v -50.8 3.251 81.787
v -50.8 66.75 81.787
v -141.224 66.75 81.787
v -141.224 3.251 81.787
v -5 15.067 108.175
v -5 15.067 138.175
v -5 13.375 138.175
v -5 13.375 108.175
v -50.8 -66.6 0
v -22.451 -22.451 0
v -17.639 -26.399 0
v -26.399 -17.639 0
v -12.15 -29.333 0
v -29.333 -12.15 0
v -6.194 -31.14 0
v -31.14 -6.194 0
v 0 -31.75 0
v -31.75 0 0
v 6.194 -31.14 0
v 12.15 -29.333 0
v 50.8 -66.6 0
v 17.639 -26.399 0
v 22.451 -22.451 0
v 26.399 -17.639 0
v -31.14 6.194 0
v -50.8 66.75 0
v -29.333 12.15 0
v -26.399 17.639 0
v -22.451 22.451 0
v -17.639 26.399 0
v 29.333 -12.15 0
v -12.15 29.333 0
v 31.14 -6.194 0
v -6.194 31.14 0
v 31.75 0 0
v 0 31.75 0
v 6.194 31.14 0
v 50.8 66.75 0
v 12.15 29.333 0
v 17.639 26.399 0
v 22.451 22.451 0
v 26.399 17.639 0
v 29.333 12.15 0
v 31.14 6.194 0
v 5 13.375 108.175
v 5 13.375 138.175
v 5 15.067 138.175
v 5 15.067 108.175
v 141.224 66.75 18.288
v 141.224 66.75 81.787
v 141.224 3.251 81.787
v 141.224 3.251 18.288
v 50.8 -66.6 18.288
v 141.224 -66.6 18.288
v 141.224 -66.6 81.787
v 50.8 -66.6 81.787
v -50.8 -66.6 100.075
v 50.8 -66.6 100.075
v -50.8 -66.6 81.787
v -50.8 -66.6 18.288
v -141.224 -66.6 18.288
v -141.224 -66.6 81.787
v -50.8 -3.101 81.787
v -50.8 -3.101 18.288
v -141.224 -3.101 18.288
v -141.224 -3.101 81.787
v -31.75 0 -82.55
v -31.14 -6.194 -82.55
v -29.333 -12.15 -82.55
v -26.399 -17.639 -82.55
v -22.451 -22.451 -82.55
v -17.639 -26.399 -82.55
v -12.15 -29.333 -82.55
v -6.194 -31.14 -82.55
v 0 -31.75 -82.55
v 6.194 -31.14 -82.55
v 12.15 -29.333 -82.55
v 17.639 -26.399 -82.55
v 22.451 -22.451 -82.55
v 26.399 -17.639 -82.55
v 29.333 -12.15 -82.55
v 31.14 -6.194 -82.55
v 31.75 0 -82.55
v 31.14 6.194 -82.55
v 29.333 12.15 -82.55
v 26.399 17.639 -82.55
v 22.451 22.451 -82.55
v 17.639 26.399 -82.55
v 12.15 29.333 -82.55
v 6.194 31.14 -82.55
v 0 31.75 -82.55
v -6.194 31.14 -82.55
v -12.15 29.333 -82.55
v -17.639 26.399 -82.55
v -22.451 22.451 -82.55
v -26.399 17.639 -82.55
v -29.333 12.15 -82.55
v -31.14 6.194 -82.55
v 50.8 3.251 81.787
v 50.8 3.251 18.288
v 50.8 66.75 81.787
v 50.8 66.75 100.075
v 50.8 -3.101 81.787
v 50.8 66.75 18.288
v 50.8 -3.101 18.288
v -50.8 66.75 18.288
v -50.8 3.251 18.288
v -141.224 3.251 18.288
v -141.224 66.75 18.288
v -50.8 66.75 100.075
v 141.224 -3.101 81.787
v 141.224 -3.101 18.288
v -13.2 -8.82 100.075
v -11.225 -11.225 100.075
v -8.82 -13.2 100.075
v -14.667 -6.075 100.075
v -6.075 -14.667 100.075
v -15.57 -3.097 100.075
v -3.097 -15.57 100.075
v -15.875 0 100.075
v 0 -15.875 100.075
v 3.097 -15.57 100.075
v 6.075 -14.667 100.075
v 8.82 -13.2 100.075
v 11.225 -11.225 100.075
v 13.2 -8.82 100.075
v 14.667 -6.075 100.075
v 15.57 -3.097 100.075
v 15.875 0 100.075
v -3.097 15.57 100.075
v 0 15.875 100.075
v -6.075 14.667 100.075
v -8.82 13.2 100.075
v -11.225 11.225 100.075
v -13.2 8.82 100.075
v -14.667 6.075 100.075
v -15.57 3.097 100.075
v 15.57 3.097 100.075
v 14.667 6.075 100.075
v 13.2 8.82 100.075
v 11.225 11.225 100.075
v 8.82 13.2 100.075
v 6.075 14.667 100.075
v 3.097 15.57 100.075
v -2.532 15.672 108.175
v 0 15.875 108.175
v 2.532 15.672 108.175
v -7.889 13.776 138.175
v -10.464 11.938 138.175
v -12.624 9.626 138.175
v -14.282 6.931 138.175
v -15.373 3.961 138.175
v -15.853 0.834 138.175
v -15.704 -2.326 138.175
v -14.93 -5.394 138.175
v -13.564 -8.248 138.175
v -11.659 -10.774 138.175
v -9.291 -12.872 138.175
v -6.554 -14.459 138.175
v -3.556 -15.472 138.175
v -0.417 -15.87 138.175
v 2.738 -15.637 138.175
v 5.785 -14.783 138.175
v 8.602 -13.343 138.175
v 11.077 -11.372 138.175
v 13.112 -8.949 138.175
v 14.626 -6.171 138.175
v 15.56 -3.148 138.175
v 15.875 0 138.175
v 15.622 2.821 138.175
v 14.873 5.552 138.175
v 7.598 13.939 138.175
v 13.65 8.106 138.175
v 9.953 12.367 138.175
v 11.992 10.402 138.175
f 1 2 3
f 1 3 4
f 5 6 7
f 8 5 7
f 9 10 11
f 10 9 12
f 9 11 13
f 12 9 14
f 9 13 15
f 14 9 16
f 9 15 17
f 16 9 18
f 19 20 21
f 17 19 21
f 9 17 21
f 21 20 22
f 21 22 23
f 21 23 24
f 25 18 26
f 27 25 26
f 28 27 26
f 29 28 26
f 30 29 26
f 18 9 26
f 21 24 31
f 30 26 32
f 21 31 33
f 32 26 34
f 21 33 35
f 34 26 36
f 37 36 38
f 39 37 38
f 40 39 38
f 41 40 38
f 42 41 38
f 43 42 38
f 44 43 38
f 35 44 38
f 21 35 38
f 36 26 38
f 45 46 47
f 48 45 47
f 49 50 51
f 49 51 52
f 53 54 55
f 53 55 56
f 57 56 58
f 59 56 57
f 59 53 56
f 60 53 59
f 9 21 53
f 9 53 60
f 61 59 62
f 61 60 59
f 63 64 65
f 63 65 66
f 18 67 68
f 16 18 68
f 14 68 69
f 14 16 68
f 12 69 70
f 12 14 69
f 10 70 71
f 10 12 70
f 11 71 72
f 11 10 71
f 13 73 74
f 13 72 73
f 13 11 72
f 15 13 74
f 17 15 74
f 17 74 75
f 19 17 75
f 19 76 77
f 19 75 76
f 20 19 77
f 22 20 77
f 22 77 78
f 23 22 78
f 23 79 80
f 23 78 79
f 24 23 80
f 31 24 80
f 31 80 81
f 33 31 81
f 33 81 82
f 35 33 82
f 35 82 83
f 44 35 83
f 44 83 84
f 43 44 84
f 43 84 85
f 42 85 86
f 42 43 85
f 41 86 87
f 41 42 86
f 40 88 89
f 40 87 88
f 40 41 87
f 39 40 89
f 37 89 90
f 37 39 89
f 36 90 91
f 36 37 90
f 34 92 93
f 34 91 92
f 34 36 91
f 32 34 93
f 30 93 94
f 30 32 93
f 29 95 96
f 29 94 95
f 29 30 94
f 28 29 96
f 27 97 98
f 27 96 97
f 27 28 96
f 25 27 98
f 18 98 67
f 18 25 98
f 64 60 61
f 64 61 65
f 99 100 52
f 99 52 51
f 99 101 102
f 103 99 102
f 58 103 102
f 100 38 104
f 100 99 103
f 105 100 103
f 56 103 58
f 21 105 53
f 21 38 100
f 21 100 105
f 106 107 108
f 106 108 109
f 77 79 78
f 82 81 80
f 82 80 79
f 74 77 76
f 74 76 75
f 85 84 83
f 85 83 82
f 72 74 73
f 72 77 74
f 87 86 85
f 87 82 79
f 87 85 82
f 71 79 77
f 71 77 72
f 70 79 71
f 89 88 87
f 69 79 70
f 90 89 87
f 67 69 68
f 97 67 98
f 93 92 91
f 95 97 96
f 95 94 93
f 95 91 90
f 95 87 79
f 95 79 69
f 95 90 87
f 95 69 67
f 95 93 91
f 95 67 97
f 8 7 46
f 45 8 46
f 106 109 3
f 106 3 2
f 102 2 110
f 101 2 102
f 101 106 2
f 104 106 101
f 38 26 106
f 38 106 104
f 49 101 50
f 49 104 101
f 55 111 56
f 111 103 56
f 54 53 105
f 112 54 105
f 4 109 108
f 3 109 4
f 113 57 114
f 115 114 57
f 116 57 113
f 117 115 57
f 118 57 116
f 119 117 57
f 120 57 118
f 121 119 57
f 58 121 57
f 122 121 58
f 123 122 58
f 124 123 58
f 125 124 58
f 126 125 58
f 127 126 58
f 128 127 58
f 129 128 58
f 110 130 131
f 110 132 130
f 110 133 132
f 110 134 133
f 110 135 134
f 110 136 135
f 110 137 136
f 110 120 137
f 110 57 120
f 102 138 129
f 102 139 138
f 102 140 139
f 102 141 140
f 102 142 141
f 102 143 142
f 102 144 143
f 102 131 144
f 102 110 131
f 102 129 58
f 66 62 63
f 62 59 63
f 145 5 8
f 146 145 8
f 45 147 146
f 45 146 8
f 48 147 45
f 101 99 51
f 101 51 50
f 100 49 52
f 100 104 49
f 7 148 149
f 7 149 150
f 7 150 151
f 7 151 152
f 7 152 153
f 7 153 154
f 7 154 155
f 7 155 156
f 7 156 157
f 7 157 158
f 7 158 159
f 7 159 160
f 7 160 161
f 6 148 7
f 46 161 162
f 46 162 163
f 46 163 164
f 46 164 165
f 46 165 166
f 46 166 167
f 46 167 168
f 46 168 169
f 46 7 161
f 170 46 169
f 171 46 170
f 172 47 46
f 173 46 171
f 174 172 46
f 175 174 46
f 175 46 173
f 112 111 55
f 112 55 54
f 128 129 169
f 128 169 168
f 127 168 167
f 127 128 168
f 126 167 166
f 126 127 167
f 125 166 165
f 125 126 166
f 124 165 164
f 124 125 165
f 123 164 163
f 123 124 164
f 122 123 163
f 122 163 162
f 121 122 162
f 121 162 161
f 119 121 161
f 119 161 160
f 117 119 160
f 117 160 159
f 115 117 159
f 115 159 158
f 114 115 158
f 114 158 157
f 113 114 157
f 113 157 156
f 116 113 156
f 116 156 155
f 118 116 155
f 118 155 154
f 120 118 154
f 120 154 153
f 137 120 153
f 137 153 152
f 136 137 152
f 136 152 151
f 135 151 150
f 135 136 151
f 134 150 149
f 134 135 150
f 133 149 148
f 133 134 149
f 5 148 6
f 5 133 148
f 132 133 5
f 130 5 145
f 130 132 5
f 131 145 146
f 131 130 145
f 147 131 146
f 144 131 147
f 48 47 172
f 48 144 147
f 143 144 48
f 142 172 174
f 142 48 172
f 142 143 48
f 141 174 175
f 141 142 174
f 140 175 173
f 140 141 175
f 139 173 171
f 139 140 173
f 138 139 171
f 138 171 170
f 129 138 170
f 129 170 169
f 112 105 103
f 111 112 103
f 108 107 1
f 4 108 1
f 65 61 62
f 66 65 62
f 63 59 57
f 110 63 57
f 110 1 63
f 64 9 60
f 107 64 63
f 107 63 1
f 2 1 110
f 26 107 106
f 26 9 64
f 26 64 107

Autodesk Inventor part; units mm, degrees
ref_plane "YZ Plane" through (0, 0, 0) normal (1, 0, 0) x (0, 1, 0)
ref_plane "XZ Plane" through (0, 0, 0) normal (0, 1, 0) x (-1, 0, 0)
ref_plane "XY Plane" through (0, 0, 0) normal (0, 0, 1) x (1, 0, 0)
sketch "Sketch1" plane through (0, 0, 0) normal (0, 0, 1) x (1, 0, 0)
  line L0 (-50.8, 66.75) -> (50.8, 66.75)
  line L1 (50.8, 66.75) -> (50.8, -66.6)
  line L2 (50.8, -66.6) -> (-50.8, -66.6)
  line L3 (-50.8, -66.6) -> (-50.8, 66.75)
  point P0 (0, 0)
  dimension "d1" = 101.6
  dimension "d2" = 133.35
  dimension "d3" = 66.75
  dimension "d4" = 50.8
extrude "Extrusion1" add sketch "Sketch1" along normal blind 100.075
sketch "Sketch2" plane through (0, 0, 100.075) normal (0, 0, 1) x (1, 0, 0)
  circle A0 centre (0, 0) radius 15.875
  dimension "d7" = 31.75
extrude "Extrusion2" add sketch "Sketch2" along normal blind 38.1
sketch "Sketch3" plane through (0, 0, 0) normal (0, 0, -1) x (-1, 0, 0)
  circle A0 centre (0, 0) radius 31.75
  dimension "d10" = 63.5
extrude "Extrusion3" add sketch "Sketch3" along normal blind 82.55
sketch "Sketch4" plane through (50.8, -66.6, 0) normal (1, 0, 0) x (0, 0, -1)
  line L0 (0, 133.35) -> (-100.075, 133.35) projected
  line L1 (-81.787, 133.35) -> (-18.288, 133.35)
  line L2 (-18.288, 133.35) -> (-18.288, 69.851)
  line L3 (-18.288, 69.851) -> (-81.787, 69.851)
  line L4 (-81.787, 69.851) -> (-81.787, 133.35)
  line L5 (0, 133.35) -> (0, 0) projected
  line L6 (-100.075, 0) -> (-100.075, 133.35) projected
  line L7 (0, 0) -> (-100.075, 0) projected
  line L8 (-81.787, 0) -> (-18.288, 0)
  line L9 (-18.288, 0) -> (-18.288, 63.499)
  line L10 (-18.288, 63.499) -> (-81.787, 63.499)
  line L11 (-81.787, 63.499) -> (-81.787, 0)
  point P0 (0, 66.6)
  dimension "d13" = 18.288
  dimension "d14" = 18.288
  dimension "d15" = 63.499
  dimension "d16" = 63.499
  dimension "d17" = 63.499
extrude "Extrusion4" add sketch "Sketch4" along normal blind 90.424 contours L2 L3 L4 L0 | L7 L11 L10 L9
sketch "Sketch5" plane through (-50.8, -66.6, 0) normal (-1, 0, 0) x (0, 0, 1)
  line L0 (18.288, 69.851) -> (18.288, 133.35) projected
  line L1 (18.288, 69.851) -> (81.787, 69.851) projected
  line L2 (18.288, 133.35) -> (81.787, 133.35)
  line L3 (81.787, 133.35) -> (81.787, 69.851)
  line L4 (81.787, 69.851) -> (18.288, 69.851)
  line L5 (18.288, 69.851) -> (18.288, 133.35)
  line L6 (18.288, 0) -> (18.288, 63.499) projected
  line L7 (81.787, 0) -> (81.787, 63.499) projected
  line L8 (18.288, 63.499) -> (81.787, 63.499)
  line L9 (81.787, 63.499) -> (81.787, 0)
  line L10 (81.787, 0) -> (18.288, 0)
  line L11 (18.288, 0) -> (18.288, 63.499)
  point P0 (0, 66.6)
extrude "Extrusion5" add sketch "Sketch5" along normal blind 90.424
sketch "Sketch7" plane through (0, 0, 138.175) normal (0, 0, 1) x (1, 0, 0)
  line L0 (-5, 13.375) -> (5, 13.375)
  line L1 (5, 13.375) -> (5, 18.375)
  line L2 (5, 18.375) -> (-5, 18.375)
  line L3 (-5, 18.375) -> (-5, 13.375)
  circle A0 centre (0, 0) radius 15.875 projected
  line L4 (-5, 13.375) -> (5, 18.375) construction
  line L5 (5, 13.375) -> (-5, 18.375) construction
  point P0 (0, 15.875)
  point P1 (5, 15.067)
  point P2 (-5, 15.067)
  dimension "d22" = 10
  dimension "d23" = 5
extrude "Extrusion6" cut sketch "Sketch7" against normal blind 30 contours L3 A0 L1 L0 picked at (-0.5641, 14.1782)
equation "\"d16\" = d15"
equation "\"d17\" = d15"
properties part number "Semi Rotary Hydraulic Motor"
